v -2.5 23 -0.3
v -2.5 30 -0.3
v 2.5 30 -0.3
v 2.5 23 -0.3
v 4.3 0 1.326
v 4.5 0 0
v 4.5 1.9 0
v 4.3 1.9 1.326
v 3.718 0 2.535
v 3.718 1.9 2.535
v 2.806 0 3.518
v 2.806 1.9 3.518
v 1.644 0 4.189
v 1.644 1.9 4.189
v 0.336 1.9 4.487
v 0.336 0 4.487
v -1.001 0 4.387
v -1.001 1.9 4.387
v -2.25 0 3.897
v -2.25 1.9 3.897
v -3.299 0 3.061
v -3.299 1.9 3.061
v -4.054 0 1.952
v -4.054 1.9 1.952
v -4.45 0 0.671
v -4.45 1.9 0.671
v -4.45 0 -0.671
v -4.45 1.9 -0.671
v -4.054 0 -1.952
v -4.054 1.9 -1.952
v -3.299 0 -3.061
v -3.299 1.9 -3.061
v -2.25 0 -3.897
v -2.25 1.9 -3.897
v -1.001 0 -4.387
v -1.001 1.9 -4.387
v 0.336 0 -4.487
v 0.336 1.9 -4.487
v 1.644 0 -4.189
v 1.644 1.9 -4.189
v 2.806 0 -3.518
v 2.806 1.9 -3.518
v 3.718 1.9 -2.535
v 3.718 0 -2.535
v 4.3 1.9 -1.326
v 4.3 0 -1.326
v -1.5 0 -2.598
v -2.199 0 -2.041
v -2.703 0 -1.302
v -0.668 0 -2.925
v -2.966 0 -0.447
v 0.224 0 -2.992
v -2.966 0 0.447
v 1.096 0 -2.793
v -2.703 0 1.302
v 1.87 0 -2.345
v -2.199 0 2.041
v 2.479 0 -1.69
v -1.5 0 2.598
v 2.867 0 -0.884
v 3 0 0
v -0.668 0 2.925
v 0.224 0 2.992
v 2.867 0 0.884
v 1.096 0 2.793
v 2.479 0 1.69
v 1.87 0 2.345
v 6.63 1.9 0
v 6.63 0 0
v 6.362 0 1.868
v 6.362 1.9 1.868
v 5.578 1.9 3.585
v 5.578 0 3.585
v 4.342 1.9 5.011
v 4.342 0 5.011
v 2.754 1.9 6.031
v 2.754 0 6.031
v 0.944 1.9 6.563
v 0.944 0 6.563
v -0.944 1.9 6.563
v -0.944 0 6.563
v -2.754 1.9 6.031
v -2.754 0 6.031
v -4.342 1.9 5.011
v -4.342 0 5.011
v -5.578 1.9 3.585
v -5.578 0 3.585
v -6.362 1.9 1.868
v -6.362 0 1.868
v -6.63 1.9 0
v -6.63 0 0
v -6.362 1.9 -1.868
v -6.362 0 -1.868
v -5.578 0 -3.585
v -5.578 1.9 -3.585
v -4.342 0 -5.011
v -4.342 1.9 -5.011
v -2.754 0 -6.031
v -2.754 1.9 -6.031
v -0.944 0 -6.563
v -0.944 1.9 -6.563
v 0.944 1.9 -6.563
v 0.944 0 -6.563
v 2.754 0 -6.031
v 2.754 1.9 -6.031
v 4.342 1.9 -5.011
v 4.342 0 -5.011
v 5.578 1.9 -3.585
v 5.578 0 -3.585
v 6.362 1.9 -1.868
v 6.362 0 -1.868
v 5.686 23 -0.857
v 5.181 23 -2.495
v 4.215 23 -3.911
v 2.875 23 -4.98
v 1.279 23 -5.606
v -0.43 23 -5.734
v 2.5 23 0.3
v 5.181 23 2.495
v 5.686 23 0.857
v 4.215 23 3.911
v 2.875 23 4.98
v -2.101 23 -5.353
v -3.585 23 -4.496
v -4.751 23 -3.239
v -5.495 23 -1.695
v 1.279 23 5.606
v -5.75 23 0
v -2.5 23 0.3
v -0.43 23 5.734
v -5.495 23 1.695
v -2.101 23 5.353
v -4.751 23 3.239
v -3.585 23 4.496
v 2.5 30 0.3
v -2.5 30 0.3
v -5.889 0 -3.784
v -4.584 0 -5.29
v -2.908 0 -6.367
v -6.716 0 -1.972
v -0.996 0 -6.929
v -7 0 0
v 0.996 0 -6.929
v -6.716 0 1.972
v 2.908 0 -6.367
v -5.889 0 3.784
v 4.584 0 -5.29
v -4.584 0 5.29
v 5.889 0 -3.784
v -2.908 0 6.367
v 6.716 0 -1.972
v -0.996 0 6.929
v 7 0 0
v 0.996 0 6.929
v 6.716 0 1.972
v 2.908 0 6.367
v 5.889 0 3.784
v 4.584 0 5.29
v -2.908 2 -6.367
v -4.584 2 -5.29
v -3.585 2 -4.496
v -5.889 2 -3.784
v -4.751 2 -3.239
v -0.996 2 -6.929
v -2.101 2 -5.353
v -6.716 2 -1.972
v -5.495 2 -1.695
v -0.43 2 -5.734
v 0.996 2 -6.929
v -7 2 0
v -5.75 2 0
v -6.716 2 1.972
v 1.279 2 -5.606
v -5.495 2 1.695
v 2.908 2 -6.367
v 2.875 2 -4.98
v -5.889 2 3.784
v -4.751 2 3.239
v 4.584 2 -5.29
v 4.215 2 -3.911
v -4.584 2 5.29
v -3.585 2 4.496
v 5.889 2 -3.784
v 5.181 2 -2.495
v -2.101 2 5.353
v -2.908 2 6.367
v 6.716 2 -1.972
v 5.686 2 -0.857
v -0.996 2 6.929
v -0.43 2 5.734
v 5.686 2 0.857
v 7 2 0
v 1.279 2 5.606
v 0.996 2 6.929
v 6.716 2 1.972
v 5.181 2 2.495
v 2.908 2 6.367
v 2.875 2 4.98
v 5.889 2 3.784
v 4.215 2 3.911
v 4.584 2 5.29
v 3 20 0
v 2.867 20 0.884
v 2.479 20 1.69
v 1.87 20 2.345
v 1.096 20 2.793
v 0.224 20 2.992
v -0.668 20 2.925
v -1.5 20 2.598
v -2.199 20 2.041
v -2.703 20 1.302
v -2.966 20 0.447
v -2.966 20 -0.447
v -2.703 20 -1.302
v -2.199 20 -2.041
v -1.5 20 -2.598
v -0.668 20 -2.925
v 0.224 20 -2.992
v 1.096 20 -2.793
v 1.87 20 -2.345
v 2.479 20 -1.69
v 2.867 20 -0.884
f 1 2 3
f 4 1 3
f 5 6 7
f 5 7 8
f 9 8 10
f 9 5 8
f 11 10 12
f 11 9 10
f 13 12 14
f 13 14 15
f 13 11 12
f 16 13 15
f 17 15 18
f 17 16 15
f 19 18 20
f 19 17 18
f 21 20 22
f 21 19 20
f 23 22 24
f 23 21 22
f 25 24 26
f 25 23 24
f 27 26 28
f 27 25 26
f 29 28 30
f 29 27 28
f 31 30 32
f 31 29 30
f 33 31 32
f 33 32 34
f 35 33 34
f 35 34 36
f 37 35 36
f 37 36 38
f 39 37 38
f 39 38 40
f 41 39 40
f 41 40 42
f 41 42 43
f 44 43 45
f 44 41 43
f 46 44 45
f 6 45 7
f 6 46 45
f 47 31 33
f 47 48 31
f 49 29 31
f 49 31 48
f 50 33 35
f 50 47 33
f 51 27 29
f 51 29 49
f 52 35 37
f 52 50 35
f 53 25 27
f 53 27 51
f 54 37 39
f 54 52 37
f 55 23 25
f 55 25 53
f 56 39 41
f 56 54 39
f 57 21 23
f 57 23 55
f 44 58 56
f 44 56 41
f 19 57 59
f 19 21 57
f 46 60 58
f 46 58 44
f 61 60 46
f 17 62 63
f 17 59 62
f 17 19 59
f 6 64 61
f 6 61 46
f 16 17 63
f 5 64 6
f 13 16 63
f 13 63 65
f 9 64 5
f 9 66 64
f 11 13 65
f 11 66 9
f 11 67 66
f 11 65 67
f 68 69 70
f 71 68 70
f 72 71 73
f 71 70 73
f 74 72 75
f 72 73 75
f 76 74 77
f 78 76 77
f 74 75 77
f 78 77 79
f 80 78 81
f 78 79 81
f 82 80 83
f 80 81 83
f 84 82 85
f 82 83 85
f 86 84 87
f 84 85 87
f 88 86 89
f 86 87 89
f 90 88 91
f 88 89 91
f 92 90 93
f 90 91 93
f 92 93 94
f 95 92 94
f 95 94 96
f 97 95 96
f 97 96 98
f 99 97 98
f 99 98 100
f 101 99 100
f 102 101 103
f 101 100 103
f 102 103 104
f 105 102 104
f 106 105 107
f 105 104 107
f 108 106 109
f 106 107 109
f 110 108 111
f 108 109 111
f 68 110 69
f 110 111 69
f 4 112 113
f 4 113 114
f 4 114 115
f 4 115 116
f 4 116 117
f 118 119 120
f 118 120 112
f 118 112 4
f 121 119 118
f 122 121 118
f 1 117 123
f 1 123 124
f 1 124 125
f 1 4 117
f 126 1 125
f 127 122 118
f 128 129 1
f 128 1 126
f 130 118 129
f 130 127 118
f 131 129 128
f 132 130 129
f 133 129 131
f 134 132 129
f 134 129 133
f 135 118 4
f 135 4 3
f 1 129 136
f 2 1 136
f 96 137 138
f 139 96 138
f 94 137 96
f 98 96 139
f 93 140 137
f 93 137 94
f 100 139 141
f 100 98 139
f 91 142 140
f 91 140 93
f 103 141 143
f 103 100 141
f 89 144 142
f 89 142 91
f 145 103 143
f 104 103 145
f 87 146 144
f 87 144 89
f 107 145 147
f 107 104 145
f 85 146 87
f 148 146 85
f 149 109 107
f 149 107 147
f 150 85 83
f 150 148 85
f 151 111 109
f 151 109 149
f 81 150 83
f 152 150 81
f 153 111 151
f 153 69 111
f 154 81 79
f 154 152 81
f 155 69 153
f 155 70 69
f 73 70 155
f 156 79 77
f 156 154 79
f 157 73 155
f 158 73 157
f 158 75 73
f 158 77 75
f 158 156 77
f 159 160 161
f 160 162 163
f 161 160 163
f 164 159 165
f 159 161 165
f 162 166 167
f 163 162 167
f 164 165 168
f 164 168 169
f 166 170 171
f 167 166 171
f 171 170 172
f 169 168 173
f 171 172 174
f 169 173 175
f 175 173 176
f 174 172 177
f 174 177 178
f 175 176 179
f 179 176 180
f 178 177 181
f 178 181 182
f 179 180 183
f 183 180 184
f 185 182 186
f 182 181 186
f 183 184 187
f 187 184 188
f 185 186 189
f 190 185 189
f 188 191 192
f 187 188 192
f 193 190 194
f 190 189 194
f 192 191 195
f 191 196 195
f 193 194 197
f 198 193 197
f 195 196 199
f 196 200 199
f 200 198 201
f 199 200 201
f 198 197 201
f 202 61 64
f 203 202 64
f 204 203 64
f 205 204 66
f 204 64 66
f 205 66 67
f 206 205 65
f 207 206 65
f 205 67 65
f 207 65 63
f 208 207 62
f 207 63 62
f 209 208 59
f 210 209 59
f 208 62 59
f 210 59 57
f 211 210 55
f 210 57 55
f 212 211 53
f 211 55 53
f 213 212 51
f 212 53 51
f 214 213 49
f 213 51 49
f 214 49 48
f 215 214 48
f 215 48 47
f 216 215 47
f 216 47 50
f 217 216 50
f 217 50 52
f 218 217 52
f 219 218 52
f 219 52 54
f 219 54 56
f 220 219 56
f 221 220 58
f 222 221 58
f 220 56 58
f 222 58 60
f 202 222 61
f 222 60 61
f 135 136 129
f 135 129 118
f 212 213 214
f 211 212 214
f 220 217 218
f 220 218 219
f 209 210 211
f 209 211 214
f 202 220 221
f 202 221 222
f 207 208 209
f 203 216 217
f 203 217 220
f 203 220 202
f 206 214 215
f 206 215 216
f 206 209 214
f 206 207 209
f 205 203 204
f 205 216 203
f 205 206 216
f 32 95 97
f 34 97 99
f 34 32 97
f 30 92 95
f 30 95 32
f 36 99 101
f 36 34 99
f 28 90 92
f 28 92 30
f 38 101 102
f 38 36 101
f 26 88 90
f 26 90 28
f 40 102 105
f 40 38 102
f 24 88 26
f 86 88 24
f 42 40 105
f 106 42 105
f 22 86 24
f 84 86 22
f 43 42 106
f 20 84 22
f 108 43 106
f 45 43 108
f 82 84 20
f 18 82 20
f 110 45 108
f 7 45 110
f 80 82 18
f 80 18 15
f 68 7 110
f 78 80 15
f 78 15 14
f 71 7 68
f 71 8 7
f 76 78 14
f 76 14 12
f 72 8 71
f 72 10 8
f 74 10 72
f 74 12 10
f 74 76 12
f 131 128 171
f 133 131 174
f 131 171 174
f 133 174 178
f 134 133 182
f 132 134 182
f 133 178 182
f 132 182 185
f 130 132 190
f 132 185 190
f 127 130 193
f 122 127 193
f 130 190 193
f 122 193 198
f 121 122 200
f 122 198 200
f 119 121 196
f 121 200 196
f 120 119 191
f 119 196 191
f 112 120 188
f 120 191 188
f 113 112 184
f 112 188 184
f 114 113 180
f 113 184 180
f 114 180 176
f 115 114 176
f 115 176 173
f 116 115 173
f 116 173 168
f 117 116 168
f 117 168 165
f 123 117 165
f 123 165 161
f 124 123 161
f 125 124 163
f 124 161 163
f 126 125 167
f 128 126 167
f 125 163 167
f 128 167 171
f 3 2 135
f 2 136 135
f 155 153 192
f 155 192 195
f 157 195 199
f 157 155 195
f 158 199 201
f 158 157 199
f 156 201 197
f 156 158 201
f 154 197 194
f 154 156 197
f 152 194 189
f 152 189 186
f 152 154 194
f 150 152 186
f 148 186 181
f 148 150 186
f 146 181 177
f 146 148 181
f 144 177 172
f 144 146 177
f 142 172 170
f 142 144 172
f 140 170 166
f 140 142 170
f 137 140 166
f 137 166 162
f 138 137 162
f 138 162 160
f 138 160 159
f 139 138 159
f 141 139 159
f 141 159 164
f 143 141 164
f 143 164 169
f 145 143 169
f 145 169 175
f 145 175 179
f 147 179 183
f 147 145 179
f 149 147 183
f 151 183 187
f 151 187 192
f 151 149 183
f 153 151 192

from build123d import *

# Parameters (mm, degrees)
F0_R     = 7
F1_DEPTH = 2
F2_R     = 5.75
F3_DEPTH = 21
F4_R     = 3
F5_DEPTH = 20
F6_R     = 6.6303140267
F6_R_2   = 4.5
F7_DEPTH = 1.9
F8_W     = 5
F8_H     = 8
F9_DEPTH = 0.3


with BuildPart() as f1:
    # F0 (on Front) → F1 (new body)
    with BuildSketch(Plane.XZ):
        Circle(F0_R)
    extrude(amount=-F1_DEPTH)

    # F2 (on face) → F3 (join)
    with BuildSketch(Plane(origin=(0, 2, 0), x_dir=(-1, 0, 0), z_dir=(0, 1, 0))):
        Circle(F2_R)
    extrude(amount=F3_DEPTH)

    # F4 (on face) → F5 (cut)
    with BuildSketch(Plane.XZ):
        Circle(F4_R)
    extrude(amount=-F5_DEPTH, mode=Mode.SUBTRACT)

    # F6 (on face) → F7 (cut)
    with BuildSketch(Plane.XZ):
        Circle(F6_R)
        Circle(F6_R_2, mode=Mode.SUBTRACT)
    extrude(amount=-F7_DEPTH, mode=Mode.SUBTRACT)

    # F8 (on Top) → F9 (join, symmetric)
    with BuildSketch(Plane.XY):
        with Locations((0, 26)):
            Rectangle(F8_W, F8_H)
    extrude(amount=F9_DEPTH, both=True)


solid = f1.part
